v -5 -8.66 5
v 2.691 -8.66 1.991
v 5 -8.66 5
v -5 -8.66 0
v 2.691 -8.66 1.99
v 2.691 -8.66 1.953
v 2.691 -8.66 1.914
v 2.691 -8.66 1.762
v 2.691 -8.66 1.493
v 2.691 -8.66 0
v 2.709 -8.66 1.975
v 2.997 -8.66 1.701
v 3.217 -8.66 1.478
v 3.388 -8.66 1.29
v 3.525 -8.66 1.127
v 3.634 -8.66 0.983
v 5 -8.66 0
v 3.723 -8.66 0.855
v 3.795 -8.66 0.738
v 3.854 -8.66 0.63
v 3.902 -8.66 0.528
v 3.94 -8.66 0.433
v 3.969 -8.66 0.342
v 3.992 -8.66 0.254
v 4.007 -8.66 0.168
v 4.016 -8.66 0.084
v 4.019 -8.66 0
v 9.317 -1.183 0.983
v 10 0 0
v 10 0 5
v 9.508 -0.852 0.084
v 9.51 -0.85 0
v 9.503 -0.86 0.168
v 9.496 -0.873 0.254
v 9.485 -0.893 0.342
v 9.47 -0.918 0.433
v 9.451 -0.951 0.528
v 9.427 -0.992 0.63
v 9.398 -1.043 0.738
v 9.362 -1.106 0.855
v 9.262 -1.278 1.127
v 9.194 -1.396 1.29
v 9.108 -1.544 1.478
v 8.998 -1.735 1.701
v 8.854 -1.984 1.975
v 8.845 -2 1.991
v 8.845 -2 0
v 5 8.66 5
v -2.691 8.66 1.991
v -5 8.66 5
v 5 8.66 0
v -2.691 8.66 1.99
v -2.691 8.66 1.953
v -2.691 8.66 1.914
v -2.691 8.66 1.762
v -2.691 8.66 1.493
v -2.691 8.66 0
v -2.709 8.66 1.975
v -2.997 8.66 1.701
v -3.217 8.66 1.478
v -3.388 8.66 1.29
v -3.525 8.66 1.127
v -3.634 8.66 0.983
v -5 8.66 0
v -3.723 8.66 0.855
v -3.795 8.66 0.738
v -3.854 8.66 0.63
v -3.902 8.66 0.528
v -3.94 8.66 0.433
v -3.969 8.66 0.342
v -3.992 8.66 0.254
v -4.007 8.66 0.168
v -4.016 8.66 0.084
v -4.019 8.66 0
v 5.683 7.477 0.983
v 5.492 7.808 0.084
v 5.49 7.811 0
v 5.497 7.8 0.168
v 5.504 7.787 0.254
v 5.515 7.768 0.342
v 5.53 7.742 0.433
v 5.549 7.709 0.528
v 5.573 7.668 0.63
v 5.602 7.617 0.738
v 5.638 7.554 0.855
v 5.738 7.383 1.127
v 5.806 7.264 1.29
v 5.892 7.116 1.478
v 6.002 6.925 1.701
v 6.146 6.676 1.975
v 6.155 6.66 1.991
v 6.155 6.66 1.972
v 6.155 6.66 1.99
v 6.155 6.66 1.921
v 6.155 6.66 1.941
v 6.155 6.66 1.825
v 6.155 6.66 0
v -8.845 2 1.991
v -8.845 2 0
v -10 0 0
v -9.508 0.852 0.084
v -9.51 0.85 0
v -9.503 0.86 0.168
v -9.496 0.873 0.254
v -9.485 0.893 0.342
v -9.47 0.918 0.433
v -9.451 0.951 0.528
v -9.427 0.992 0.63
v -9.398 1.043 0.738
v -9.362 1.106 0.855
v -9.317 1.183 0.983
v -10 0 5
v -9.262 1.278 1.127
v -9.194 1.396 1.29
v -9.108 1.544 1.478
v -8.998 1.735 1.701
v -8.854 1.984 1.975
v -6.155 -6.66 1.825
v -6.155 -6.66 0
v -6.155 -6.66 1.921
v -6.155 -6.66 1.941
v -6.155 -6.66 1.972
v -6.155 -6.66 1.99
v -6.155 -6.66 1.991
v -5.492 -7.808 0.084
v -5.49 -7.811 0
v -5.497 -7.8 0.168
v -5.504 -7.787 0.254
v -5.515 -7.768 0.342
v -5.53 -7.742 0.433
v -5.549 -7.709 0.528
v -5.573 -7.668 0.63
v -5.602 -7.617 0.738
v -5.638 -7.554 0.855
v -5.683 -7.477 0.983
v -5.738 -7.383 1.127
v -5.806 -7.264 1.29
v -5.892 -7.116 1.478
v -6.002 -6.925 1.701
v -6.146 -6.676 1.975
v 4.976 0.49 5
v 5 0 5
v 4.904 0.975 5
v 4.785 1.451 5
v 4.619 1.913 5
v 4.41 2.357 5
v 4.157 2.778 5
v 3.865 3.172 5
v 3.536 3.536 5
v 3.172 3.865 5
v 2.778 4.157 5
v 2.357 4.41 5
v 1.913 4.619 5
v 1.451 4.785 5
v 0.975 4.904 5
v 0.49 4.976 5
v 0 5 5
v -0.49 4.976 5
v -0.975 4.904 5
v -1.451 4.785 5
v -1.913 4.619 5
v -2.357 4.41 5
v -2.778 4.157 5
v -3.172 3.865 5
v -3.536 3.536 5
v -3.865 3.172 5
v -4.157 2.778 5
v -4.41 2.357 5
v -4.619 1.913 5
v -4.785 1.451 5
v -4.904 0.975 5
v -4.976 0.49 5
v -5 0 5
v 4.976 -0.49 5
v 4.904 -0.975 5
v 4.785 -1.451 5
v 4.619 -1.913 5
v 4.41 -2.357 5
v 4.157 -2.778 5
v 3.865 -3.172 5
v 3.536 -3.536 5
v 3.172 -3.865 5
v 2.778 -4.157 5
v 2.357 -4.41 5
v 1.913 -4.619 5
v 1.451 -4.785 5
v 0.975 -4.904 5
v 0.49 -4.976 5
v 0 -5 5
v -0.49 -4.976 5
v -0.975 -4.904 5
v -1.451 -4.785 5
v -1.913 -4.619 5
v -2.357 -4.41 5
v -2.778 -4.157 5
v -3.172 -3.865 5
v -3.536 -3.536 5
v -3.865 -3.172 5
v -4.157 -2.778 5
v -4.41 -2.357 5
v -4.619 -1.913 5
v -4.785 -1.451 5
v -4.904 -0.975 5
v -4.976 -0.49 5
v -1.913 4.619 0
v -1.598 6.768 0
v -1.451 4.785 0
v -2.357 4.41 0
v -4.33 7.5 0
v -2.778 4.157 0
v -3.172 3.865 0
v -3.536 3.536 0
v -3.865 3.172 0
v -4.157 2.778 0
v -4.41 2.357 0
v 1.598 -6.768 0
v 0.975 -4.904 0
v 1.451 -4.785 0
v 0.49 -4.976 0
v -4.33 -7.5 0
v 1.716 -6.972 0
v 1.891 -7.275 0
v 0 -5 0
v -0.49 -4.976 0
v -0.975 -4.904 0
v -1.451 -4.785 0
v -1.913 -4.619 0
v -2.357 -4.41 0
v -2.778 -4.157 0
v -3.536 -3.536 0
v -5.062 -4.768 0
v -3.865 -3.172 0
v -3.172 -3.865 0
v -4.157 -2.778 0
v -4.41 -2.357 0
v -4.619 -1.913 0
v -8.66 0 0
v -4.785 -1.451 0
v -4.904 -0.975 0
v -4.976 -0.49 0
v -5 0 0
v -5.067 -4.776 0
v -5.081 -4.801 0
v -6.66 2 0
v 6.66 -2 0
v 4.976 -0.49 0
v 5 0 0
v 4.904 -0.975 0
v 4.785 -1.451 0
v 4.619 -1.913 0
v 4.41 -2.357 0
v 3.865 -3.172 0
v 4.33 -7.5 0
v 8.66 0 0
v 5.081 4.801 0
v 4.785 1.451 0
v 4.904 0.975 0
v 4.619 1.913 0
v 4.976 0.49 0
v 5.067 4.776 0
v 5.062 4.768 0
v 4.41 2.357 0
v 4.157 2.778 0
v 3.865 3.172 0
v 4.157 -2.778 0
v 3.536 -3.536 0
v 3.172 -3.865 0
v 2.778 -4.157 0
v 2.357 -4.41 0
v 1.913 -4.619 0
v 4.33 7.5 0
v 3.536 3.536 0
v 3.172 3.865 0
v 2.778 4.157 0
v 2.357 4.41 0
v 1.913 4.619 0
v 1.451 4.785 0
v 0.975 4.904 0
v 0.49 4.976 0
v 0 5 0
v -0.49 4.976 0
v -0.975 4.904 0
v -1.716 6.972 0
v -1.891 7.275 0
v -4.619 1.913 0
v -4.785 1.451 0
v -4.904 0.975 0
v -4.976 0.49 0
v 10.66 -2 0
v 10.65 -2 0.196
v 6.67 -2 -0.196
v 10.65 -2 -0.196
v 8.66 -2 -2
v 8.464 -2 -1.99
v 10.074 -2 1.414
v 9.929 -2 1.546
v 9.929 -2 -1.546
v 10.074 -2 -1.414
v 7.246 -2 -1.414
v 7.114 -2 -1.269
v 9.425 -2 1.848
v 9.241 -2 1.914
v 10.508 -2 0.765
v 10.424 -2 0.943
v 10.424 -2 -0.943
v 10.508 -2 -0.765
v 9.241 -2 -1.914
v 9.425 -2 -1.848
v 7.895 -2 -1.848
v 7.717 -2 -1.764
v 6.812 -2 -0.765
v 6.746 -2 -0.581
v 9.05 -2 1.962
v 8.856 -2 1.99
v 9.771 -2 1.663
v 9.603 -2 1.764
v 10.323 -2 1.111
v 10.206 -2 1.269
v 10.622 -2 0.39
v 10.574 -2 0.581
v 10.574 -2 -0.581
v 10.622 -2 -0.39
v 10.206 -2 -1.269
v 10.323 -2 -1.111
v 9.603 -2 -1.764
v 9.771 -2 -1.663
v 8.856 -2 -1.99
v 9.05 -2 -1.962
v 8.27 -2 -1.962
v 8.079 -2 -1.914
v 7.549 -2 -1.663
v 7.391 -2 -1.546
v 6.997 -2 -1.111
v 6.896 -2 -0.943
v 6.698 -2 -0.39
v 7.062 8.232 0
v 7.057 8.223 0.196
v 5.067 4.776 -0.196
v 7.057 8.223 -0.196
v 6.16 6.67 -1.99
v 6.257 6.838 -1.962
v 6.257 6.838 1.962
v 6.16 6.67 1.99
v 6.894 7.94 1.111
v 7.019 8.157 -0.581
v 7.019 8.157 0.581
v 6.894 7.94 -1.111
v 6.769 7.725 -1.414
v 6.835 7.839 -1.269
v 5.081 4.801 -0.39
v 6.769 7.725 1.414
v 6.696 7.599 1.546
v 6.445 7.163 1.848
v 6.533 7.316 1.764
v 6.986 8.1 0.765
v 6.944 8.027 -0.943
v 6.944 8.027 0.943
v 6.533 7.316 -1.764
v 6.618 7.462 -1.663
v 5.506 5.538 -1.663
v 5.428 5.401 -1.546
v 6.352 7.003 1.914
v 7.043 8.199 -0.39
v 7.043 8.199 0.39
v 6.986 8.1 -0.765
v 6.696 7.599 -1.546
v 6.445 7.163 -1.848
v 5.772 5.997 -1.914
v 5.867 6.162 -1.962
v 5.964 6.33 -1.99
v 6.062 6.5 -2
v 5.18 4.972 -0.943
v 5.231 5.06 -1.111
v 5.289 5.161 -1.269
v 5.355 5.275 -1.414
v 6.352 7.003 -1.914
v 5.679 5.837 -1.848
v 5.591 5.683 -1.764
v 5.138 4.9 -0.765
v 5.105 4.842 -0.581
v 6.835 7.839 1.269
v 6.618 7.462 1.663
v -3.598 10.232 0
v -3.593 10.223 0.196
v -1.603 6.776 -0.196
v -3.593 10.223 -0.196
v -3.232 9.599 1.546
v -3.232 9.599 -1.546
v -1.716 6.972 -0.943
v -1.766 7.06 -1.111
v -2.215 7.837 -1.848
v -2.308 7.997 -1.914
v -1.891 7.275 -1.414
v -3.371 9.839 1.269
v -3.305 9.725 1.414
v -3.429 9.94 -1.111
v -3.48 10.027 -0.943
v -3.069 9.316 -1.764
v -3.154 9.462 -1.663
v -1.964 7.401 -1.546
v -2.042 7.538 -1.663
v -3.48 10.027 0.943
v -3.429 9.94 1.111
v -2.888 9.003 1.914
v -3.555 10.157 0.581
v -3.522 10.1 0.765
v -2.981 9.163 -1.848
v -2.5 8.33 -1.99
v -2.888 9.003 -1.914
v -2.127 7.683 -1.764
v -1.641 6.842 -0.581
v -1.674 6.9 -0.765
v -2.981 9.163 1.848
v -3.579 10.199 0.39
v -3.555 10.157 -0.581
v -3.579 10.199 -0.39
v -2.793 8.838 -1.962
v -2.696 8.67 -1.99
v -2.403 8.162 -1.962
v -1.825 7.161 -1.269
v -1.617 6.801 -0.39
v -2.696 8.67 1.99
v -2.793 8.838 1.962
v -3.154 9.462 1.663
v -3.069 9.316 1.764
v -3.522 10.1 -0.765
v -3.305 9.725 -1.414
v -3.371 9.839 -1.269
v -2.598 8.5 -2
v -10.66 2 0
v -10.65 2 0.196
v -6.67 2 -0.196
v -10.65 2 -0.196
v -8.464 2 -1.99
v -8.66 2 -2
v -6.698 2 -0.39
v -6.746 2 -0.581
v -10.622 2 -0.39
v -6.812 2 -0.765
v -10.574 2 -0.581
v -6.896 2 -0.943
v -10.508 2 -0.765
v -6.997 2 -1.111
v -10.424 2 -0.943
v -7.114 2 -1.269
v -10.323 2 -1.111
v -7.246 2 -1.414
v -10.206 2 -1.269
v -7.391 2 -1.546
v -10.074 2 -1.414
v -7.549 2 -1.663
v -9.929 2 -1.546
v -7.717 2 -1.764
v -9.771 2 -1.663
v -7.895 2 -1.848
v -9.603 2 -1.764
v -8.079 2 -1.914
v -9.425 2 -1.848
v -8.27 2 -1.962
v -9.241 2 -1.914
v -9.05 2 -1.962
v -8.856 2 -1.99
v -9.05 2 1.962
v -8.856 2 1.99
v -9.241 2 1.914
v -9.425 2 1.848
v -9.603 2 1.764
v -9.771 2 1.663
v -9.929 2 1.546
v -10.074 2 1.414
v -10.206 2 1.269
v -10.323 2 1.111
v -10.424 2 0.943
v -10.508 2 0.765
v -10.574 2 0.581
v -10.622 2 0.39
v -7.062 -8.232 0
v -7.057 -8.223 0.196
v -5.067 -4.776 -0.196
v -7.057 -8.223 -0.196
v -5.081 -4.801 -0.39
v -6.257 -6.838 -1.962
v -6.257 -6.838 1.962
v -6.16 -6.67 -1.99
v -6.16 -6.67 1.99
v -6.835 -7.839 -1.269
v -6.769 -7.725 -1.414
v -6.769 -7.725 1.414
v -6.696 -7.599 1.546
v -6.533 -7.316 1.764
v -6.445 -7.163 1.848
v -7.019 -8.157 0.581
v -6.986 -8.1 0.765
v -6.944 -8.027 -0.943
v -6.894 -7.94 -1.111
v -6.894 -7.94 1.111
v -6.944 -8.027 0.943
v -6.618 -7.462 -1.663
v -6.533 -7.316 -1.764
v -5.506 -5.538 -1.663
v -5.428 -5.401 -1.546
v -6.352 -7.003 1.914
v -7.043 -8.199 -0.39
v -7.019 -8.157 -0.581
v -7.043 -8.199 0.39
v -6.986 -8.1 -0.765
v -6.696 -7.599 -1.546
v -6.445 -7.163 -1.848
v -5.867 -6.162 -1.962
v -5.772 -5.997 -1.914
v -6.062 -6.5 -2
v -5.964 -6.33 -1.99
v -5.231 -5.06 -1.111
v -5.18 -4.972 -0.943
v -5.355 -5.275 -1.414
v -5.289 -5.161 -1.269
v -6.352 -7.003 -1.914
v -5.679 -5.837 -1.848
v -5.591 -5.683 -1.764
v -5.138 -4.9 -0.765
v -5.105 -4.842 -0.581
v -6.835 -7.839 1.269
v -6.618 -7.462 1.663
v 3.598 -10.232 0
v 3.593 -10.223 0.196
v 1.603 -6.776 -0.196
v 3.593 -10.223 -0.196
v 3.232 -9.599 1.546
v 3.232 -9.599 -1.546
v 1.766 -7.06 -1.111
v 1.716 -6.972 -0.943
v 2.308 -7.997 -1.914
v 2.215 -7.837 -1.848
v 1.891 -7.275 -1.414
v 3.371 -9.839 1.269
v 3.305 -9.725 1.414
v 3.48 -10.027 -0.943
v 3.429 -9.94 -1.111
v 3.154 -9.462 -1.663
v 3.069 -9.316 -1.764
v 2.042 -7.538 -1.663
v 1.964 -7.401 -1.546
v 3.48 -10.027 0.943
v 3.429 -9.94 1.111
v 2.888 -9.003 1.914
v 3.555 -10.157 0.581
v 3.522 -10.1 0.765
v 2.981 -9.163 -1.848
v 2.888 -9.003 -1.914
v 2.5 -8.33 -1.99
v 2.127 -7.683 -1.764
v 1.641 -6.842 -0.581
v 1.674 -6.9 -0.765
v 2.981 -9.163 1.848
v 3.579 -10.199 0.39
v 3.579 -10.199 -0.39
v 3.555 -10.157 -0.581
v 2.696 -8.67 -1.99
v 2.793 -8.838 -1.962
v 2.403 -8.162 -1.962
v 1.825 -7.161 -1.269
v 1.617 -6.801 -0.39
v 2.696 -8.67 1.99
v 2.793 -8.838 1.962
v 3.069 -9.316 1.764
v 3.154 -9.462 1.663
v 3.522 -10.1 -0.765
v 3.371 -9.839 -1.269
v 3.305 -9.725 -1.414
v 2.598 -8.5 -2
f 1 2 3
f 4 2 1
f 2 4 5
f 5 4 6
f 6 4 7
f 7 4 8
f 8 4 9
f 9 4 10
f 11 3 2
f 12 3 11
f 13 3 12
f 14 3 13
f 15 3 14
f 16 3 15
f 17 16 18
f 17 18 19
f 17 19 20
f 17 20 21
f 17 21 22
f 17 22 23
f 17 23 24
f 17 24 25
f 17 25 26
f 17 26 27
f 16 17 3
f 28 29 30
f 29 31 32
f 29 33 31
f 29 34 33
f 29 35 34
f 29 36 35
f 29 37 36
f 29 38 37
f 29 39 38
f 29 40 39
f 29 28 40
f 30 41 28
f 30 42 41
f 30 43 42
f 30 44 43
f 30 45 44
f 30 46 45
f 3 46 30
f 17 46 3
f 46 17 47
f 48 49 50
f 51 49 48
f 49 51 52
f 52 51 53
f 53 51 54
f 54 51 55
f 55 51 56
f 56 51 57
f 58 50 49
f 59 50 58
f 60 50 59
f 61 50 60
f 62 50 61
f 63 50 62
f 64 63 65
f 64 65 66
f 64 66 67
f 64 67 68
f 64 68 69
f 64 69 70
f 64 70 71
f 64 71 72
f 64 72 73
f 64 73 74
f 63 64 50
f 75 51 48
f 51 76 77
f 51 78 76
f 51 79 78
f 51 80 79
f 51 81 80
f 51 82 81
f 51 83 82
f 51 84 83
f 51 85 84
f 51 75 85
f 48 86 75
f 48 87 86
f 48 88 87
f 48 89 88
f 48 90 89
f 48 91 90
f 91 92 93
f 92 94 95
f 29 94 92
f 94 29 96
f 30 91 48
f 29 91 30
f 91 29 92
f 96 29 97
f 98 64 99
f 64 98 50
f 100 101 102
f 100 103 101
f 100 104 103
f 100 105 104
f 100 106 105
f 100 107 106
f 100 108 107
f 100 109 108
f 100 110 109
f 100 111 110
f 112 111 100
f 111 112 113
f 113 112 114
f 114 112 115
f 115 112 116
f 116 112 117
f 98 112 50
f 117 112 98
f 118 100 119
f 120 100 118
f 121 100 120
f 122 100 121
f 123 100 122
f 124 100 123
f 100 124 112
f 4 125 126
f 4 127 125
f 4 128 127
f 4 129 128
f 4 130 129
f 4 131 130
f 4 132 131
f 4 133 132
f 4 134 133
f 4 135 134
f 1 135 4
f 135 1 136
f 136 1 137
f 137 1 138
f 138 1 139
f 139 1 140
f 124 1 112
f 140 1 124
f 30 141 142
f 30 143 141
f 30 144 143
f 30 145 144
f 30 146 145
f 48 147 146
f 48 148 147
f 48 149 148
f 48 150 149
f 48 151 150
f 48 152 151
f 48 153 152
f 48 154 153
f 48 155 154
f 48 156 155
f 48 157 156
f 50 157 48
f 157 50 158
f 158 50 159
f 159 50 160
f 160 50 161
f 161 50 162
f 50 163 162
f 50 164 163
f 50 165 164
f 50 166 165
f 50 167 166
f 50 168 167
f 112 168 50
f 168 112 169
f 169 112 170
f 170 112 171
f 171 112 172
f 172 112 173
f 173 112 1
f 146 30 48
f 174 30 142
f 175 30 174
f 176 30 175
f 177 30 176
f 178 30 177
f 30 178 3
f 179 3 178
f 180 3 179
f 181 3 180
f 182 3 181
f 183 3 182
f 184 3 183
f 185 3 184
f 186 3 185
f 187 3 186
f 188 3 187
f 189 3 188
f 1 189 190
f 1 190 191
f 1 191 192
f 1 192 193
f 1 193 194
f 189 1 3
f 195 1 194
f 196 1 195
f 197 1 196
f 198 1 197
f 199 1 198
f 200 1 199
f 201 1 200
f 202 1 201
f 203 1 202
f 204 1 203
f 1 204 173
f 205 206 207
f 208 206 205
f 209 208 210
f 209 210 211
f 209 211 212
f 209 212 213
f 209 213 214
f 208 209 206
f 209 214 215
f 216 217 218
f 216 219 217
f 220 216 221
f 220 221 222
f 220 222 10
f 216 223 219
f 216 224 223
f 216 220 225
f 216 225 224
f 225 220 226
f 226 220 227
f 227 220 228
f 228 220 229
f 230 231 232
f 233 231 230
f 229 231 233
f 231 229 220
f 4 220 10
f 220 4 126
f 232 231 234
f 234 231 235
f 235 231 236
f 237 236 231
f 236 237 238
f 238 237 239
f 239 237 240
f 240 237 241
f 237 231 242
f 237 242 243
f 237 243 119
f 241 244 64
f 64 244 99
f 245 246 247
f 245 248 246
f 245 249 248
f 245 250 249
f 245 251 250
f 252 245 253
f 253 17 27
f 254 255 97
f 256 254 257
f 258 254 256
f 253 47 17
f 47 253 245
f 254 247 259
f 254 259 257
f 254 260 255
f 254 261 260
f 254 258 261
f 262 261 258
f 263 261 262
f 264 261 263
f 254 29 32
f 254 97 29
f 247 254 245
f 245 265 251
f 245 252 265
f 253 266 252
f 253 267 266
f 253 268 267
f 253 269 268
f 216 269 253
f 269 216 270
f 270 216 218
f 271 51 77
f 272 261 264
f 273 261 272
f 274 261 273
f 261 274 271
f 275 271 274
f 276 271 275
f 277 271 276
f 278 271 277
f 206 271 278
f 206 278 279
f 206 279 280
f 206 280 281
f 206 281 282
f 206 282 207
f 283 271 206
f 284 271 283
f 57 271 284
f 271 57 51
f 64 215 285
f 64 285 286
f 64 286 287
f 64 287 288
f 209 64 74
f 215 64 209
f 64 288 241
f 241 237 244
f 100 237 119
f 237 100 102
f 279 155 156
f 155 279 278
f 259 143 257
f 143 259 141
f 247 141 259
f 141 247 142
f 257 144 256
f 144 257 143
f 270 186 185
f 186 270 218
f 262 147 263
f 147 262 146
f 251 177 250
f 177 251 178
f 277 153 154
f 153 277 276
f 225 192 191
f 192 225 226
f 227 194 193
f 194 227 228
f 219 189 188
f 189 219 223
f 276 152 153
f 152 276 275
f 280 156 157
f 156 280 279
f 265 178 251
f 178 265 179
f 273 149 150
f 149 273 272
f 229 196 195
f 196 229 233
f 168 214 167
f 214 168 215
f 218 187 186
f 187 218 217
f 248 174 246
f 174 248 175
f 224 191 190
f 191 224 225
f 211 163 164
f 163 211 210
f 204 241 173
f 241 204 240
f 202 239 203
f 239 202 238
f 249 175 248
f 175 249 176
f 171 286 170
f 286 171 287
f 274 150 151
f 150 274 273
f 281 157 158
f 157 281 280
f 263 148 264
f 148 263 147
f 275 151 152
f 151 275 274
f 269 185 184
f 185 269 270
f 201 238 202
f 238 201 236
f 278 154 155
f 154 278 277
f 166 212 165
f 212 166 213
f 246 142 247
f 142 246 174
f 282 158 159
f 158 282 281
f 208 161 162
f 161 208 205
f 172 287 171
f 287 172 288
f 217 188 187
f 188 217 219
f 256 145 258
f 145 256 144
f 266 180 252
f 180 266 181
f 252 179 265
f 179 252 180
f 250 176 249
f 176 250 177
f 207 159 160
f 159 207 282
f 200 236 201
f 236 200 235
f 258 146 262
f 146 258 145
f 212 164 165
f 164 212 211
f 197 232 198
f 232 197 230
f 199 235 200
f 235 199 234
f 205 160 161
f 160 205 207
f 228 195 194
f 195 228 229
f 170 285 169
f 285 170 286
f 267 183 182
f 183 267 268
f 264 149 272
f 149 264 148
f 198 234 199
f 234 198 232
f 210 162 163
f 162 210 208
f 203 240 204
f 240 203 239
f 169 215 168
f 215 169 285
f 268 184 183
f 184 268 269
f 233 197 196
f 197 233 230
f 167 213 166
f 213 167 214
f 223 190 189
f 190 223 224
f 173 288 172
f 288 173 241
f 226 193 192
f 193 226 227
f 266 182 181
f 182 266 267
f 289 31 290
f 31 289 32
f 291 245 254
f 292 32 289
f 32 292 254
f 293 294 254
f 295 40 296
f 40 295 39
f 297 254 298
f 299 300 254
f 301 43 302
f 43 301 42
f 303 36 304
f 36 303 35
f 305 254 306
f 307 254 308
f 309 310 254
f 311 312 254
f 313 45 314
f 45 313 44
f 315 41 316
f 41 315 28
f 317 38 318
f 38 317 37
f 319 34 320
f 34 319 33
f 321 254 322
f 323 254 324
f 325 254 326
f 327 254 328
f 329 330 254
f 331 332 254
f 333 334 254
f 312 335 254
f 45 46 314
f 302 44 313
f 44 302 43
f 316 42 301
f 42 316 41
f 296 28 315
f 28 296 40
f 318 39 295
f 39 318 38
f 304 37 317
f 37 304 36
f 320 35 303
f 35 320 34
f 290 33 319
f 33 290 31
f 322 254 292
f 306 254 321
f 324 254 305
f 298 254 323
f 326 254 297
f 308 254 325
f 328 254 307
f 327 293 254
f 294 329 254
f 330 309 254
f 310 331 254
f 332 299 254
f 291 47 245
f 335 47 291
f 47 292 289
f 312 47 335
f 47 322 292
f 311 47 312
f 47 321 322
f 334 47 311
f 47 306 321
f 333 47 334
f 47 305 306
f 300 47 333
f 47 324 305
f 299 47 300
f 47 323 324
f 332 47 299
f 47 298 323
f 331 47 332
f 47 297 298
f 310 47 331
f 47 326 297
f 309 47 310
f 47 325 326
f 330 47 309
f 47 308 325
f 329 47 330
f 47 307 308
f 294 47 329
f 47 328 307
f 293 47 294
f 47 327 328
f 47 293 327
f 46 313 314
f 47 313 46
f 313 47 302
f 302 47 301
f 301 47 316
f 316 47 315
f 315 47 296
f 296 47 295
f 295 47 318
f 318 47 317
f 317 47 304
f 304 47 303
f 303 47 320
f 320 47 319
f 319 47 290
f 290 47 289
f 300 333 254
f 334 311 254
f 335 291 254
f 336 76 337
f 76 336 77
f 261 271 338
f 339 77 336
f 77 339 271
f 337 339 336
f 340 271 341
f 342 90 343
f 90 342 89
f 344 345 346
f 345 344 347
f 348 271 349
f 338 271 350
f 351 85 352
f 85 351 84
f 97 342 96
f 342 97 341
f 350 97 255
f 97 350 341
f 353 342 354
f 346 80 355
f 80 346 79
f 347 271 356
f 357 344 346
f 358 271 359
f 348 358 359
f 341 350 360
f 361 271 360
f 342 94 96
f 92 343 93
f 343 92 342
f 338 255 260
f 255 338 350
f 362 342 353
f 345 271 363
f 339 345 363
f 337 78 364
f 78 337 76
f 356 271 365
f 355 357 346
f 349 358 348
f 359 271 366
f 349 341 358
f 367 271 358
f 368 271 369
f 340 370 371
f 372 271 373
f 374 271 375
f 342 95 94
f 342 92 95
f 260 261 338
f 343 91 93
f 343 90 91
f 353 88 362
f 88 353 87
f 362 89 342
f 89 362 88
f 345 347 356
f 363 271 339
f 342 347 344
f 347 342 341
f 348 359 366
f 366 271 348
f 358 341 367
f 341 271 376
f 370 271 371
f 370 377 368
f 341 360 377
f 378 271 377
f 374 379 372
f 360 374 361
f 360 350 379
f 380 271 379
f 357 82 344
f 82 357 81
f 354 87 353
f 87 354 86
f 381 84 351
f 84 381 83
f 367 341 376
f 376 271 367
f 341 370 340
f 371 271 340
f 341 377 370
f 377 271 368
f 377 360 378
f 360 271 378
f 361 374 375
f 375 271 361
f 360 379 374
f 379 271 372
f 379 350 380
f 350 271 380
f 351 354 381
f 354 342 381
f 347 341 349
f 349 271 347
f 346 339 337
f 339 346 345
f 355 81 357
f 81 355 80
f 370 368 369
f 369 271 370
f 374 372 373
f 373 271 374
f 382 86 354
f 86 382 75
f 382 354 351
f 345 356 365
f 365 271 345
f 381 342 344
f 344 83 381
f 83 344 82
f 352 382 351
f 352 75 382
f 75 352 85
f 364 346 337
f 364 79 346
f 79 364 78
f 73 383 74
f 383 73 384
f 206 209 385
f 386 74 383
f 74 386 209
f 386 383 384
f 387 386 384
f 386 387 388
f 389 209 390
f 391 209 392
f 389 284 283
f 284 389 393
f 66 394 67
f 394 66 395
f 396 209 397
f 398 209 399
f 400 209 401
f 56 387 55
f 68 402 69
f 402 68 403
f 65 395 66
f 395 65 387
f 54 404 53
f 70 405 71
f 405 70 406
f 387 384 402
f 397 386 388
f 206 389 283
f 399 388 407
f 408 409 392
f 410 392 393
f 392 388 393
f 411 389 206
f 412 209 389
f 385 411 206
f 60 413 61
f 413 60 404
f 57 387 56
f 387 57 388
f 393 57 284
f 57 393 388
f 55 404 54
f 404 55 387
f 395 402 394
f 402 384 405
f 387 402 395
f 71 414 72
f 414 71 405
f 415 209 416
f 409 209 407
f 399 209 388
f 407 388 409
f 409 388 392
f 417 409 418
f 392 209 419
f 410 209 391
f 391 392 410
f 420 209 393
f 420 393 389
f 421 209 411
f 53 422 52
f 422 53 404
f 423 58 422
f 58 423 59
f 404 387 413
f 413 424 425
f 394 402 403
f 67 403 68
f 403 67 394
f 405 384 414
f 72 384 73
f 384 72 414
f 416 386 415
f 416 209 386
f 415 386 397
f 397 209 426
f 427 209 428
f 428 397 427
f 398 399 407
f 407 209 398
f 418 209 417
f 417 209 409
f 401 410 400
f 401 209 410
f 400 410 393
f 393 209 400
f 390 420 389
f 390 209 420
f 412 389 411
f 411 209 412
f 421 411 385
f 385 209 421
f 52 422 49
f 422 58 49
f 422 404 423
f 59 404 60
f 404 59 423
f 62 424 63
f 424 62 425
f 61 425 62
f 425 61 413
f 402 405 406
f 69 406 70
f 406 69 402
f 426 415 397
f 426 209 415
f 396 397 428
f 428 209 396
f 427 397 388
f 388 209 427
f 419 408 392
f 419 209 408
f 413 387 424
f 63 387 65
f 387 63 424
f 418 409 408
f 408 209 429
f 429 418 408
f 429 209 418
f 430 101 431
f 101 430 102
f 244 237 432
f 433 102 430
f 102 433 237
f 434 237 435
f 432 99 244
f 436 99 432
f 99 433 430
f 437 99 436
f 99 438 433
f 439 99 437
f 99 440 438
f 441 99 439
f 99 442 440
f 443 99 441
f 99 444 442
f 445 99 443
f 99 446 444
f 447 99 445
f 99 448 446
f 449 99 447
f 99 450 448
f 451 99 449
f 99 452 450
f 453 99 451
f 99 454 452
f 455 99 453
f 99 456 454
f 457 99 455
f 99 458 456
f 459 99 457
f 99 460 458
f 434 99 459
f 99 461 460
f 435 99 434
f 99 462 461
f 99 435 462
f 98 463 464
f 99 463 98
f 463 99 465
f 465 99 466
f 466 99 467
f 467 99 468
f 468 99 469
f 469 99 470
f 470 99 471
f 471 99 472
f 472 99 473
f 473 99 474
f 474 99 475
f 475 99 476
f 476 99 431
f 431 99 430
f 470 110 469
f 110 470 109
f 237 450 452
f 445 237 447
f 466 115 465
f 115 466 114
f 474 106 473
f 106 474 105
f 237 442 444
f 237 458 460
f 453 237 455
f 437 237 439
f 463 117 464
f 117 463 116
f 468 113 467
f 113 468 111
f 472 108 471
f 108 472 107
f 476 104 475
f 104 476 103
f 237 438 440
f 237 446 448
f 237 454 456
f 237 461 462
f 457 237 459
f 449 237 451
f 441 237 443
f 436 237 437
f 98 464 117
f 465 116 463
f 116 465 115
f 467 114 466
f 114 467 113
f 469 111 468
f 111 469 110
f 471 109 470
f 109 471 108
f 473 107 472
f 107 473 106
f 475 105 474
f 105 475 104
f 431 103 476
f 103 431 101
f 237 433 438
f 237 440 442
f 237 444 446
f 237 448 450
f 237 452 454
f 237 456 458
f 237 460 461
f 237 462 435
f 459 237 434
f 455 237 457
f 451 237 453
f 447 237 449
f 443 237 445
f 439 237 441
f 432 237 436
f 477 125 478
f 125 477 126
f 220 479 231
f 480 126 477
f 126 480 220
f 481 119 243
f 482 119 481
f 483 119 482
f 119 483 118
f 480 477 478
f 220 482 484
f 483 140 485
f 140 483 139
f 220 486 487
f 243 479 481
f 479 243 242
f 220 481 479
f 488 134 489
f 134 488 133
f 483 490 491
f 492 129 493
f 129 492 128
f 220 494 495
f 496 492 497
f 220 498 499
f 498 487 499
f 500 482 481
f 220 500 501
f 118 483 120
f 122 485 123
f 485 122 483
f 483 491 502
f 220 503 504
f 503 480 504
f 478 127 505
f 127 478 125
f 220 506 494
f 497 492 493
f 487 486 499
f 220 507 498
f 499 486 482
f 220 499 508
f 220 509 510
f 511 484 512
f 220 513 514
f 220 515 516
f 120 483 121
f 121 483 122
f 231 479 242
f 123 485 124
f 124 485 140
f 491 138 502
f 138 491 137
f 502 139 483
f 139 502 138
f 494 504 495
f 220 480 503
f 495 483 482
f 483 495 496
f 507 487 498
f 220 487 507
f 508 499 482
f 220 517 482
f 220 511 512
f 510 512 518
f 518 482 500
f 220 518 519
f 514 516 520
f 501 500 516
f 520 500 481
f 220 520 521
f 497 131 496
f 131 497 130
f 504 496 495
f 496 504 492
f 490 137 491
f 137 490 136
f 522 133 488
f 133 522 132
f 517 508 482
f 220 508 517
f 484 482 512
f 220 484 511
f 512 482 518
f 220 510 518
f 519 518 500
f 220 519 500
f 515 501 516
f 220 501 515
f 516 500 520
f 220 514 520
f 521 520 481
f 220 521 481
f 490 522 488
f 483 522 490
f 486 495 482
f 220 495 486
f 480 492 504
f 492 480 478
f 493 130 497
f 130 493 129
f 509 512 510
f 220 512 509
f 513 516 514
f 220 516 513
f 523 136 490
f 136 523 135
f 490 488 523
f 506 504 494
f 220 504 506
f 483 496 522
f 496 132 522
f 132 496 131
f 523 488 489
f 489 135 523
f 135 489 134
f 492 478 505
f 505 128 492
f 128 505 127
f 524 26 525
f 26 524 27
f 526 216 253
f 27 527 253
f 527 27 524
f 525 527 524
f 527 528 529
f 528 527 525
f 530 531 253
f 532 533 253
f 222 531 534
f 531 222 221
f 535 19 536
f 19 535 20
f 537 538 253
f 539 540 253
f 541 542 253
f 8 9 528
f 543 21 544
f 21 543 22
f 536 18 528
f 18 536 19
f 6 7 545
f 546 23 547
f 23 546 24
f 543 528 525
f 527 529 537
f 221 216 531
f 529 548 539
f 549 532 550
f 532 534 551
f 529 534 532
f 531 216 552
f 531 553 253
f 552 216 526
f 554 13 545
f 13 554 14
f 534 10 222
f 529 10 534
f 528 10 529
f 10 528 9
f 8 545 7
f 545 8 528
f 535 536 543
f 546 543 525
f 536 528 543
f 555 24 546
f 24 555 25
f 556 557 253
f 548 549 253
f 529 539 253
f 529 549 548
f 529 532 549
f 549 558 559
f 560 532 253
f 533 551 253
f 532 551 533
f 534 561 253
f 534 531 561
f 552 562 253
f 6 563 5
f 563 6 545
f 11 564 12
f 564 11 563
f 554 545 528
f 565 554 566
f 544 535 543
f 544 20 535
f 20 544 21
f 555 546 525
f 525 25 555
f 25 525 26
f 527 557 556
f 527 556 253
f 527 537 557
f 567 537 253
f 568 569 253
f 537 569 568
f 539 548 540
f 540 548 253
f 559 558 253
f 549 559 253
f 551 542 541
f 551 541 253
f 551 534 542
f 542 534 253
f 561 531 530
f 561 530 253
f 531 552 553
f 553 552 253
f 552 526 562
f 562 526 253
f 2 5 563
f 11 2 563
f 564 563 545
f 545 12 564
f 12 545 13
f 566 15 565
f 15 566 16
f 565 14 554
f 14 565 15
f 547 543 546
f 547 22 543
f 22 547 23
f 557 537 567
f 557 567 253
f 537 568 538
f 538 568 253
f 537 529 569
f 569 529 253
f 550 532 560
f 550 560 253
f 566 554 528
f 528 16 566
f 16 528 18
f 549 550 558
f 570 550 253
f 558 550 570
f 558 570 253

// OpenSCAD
module hex_nut() {
    difference() {
        // Hexagonal prism
        scale([1, 1, 0.5])
            cylinder(r=10, h=10, $fn=6);
        
        // Circular through-hole
        translate([0, 0, -5])
            cylinder(r=5, h=20, $fn=64);
    }
}

module chamfered_hex_nut() {
    union() {
        hex_nut();
        
        // Chamfer edges
        for (i = [0:5]) {
            rotate([0, 0, i * 60])
                translate([8.66, 0, 0]) // 8.66 is the distance from center to edge of hexagon
                    rotate([90, 0, 0])
                        cylinder(r1=0, r2=2, h=2, $fn=64);
        }
    }
}

chamfered_hex_nut();
